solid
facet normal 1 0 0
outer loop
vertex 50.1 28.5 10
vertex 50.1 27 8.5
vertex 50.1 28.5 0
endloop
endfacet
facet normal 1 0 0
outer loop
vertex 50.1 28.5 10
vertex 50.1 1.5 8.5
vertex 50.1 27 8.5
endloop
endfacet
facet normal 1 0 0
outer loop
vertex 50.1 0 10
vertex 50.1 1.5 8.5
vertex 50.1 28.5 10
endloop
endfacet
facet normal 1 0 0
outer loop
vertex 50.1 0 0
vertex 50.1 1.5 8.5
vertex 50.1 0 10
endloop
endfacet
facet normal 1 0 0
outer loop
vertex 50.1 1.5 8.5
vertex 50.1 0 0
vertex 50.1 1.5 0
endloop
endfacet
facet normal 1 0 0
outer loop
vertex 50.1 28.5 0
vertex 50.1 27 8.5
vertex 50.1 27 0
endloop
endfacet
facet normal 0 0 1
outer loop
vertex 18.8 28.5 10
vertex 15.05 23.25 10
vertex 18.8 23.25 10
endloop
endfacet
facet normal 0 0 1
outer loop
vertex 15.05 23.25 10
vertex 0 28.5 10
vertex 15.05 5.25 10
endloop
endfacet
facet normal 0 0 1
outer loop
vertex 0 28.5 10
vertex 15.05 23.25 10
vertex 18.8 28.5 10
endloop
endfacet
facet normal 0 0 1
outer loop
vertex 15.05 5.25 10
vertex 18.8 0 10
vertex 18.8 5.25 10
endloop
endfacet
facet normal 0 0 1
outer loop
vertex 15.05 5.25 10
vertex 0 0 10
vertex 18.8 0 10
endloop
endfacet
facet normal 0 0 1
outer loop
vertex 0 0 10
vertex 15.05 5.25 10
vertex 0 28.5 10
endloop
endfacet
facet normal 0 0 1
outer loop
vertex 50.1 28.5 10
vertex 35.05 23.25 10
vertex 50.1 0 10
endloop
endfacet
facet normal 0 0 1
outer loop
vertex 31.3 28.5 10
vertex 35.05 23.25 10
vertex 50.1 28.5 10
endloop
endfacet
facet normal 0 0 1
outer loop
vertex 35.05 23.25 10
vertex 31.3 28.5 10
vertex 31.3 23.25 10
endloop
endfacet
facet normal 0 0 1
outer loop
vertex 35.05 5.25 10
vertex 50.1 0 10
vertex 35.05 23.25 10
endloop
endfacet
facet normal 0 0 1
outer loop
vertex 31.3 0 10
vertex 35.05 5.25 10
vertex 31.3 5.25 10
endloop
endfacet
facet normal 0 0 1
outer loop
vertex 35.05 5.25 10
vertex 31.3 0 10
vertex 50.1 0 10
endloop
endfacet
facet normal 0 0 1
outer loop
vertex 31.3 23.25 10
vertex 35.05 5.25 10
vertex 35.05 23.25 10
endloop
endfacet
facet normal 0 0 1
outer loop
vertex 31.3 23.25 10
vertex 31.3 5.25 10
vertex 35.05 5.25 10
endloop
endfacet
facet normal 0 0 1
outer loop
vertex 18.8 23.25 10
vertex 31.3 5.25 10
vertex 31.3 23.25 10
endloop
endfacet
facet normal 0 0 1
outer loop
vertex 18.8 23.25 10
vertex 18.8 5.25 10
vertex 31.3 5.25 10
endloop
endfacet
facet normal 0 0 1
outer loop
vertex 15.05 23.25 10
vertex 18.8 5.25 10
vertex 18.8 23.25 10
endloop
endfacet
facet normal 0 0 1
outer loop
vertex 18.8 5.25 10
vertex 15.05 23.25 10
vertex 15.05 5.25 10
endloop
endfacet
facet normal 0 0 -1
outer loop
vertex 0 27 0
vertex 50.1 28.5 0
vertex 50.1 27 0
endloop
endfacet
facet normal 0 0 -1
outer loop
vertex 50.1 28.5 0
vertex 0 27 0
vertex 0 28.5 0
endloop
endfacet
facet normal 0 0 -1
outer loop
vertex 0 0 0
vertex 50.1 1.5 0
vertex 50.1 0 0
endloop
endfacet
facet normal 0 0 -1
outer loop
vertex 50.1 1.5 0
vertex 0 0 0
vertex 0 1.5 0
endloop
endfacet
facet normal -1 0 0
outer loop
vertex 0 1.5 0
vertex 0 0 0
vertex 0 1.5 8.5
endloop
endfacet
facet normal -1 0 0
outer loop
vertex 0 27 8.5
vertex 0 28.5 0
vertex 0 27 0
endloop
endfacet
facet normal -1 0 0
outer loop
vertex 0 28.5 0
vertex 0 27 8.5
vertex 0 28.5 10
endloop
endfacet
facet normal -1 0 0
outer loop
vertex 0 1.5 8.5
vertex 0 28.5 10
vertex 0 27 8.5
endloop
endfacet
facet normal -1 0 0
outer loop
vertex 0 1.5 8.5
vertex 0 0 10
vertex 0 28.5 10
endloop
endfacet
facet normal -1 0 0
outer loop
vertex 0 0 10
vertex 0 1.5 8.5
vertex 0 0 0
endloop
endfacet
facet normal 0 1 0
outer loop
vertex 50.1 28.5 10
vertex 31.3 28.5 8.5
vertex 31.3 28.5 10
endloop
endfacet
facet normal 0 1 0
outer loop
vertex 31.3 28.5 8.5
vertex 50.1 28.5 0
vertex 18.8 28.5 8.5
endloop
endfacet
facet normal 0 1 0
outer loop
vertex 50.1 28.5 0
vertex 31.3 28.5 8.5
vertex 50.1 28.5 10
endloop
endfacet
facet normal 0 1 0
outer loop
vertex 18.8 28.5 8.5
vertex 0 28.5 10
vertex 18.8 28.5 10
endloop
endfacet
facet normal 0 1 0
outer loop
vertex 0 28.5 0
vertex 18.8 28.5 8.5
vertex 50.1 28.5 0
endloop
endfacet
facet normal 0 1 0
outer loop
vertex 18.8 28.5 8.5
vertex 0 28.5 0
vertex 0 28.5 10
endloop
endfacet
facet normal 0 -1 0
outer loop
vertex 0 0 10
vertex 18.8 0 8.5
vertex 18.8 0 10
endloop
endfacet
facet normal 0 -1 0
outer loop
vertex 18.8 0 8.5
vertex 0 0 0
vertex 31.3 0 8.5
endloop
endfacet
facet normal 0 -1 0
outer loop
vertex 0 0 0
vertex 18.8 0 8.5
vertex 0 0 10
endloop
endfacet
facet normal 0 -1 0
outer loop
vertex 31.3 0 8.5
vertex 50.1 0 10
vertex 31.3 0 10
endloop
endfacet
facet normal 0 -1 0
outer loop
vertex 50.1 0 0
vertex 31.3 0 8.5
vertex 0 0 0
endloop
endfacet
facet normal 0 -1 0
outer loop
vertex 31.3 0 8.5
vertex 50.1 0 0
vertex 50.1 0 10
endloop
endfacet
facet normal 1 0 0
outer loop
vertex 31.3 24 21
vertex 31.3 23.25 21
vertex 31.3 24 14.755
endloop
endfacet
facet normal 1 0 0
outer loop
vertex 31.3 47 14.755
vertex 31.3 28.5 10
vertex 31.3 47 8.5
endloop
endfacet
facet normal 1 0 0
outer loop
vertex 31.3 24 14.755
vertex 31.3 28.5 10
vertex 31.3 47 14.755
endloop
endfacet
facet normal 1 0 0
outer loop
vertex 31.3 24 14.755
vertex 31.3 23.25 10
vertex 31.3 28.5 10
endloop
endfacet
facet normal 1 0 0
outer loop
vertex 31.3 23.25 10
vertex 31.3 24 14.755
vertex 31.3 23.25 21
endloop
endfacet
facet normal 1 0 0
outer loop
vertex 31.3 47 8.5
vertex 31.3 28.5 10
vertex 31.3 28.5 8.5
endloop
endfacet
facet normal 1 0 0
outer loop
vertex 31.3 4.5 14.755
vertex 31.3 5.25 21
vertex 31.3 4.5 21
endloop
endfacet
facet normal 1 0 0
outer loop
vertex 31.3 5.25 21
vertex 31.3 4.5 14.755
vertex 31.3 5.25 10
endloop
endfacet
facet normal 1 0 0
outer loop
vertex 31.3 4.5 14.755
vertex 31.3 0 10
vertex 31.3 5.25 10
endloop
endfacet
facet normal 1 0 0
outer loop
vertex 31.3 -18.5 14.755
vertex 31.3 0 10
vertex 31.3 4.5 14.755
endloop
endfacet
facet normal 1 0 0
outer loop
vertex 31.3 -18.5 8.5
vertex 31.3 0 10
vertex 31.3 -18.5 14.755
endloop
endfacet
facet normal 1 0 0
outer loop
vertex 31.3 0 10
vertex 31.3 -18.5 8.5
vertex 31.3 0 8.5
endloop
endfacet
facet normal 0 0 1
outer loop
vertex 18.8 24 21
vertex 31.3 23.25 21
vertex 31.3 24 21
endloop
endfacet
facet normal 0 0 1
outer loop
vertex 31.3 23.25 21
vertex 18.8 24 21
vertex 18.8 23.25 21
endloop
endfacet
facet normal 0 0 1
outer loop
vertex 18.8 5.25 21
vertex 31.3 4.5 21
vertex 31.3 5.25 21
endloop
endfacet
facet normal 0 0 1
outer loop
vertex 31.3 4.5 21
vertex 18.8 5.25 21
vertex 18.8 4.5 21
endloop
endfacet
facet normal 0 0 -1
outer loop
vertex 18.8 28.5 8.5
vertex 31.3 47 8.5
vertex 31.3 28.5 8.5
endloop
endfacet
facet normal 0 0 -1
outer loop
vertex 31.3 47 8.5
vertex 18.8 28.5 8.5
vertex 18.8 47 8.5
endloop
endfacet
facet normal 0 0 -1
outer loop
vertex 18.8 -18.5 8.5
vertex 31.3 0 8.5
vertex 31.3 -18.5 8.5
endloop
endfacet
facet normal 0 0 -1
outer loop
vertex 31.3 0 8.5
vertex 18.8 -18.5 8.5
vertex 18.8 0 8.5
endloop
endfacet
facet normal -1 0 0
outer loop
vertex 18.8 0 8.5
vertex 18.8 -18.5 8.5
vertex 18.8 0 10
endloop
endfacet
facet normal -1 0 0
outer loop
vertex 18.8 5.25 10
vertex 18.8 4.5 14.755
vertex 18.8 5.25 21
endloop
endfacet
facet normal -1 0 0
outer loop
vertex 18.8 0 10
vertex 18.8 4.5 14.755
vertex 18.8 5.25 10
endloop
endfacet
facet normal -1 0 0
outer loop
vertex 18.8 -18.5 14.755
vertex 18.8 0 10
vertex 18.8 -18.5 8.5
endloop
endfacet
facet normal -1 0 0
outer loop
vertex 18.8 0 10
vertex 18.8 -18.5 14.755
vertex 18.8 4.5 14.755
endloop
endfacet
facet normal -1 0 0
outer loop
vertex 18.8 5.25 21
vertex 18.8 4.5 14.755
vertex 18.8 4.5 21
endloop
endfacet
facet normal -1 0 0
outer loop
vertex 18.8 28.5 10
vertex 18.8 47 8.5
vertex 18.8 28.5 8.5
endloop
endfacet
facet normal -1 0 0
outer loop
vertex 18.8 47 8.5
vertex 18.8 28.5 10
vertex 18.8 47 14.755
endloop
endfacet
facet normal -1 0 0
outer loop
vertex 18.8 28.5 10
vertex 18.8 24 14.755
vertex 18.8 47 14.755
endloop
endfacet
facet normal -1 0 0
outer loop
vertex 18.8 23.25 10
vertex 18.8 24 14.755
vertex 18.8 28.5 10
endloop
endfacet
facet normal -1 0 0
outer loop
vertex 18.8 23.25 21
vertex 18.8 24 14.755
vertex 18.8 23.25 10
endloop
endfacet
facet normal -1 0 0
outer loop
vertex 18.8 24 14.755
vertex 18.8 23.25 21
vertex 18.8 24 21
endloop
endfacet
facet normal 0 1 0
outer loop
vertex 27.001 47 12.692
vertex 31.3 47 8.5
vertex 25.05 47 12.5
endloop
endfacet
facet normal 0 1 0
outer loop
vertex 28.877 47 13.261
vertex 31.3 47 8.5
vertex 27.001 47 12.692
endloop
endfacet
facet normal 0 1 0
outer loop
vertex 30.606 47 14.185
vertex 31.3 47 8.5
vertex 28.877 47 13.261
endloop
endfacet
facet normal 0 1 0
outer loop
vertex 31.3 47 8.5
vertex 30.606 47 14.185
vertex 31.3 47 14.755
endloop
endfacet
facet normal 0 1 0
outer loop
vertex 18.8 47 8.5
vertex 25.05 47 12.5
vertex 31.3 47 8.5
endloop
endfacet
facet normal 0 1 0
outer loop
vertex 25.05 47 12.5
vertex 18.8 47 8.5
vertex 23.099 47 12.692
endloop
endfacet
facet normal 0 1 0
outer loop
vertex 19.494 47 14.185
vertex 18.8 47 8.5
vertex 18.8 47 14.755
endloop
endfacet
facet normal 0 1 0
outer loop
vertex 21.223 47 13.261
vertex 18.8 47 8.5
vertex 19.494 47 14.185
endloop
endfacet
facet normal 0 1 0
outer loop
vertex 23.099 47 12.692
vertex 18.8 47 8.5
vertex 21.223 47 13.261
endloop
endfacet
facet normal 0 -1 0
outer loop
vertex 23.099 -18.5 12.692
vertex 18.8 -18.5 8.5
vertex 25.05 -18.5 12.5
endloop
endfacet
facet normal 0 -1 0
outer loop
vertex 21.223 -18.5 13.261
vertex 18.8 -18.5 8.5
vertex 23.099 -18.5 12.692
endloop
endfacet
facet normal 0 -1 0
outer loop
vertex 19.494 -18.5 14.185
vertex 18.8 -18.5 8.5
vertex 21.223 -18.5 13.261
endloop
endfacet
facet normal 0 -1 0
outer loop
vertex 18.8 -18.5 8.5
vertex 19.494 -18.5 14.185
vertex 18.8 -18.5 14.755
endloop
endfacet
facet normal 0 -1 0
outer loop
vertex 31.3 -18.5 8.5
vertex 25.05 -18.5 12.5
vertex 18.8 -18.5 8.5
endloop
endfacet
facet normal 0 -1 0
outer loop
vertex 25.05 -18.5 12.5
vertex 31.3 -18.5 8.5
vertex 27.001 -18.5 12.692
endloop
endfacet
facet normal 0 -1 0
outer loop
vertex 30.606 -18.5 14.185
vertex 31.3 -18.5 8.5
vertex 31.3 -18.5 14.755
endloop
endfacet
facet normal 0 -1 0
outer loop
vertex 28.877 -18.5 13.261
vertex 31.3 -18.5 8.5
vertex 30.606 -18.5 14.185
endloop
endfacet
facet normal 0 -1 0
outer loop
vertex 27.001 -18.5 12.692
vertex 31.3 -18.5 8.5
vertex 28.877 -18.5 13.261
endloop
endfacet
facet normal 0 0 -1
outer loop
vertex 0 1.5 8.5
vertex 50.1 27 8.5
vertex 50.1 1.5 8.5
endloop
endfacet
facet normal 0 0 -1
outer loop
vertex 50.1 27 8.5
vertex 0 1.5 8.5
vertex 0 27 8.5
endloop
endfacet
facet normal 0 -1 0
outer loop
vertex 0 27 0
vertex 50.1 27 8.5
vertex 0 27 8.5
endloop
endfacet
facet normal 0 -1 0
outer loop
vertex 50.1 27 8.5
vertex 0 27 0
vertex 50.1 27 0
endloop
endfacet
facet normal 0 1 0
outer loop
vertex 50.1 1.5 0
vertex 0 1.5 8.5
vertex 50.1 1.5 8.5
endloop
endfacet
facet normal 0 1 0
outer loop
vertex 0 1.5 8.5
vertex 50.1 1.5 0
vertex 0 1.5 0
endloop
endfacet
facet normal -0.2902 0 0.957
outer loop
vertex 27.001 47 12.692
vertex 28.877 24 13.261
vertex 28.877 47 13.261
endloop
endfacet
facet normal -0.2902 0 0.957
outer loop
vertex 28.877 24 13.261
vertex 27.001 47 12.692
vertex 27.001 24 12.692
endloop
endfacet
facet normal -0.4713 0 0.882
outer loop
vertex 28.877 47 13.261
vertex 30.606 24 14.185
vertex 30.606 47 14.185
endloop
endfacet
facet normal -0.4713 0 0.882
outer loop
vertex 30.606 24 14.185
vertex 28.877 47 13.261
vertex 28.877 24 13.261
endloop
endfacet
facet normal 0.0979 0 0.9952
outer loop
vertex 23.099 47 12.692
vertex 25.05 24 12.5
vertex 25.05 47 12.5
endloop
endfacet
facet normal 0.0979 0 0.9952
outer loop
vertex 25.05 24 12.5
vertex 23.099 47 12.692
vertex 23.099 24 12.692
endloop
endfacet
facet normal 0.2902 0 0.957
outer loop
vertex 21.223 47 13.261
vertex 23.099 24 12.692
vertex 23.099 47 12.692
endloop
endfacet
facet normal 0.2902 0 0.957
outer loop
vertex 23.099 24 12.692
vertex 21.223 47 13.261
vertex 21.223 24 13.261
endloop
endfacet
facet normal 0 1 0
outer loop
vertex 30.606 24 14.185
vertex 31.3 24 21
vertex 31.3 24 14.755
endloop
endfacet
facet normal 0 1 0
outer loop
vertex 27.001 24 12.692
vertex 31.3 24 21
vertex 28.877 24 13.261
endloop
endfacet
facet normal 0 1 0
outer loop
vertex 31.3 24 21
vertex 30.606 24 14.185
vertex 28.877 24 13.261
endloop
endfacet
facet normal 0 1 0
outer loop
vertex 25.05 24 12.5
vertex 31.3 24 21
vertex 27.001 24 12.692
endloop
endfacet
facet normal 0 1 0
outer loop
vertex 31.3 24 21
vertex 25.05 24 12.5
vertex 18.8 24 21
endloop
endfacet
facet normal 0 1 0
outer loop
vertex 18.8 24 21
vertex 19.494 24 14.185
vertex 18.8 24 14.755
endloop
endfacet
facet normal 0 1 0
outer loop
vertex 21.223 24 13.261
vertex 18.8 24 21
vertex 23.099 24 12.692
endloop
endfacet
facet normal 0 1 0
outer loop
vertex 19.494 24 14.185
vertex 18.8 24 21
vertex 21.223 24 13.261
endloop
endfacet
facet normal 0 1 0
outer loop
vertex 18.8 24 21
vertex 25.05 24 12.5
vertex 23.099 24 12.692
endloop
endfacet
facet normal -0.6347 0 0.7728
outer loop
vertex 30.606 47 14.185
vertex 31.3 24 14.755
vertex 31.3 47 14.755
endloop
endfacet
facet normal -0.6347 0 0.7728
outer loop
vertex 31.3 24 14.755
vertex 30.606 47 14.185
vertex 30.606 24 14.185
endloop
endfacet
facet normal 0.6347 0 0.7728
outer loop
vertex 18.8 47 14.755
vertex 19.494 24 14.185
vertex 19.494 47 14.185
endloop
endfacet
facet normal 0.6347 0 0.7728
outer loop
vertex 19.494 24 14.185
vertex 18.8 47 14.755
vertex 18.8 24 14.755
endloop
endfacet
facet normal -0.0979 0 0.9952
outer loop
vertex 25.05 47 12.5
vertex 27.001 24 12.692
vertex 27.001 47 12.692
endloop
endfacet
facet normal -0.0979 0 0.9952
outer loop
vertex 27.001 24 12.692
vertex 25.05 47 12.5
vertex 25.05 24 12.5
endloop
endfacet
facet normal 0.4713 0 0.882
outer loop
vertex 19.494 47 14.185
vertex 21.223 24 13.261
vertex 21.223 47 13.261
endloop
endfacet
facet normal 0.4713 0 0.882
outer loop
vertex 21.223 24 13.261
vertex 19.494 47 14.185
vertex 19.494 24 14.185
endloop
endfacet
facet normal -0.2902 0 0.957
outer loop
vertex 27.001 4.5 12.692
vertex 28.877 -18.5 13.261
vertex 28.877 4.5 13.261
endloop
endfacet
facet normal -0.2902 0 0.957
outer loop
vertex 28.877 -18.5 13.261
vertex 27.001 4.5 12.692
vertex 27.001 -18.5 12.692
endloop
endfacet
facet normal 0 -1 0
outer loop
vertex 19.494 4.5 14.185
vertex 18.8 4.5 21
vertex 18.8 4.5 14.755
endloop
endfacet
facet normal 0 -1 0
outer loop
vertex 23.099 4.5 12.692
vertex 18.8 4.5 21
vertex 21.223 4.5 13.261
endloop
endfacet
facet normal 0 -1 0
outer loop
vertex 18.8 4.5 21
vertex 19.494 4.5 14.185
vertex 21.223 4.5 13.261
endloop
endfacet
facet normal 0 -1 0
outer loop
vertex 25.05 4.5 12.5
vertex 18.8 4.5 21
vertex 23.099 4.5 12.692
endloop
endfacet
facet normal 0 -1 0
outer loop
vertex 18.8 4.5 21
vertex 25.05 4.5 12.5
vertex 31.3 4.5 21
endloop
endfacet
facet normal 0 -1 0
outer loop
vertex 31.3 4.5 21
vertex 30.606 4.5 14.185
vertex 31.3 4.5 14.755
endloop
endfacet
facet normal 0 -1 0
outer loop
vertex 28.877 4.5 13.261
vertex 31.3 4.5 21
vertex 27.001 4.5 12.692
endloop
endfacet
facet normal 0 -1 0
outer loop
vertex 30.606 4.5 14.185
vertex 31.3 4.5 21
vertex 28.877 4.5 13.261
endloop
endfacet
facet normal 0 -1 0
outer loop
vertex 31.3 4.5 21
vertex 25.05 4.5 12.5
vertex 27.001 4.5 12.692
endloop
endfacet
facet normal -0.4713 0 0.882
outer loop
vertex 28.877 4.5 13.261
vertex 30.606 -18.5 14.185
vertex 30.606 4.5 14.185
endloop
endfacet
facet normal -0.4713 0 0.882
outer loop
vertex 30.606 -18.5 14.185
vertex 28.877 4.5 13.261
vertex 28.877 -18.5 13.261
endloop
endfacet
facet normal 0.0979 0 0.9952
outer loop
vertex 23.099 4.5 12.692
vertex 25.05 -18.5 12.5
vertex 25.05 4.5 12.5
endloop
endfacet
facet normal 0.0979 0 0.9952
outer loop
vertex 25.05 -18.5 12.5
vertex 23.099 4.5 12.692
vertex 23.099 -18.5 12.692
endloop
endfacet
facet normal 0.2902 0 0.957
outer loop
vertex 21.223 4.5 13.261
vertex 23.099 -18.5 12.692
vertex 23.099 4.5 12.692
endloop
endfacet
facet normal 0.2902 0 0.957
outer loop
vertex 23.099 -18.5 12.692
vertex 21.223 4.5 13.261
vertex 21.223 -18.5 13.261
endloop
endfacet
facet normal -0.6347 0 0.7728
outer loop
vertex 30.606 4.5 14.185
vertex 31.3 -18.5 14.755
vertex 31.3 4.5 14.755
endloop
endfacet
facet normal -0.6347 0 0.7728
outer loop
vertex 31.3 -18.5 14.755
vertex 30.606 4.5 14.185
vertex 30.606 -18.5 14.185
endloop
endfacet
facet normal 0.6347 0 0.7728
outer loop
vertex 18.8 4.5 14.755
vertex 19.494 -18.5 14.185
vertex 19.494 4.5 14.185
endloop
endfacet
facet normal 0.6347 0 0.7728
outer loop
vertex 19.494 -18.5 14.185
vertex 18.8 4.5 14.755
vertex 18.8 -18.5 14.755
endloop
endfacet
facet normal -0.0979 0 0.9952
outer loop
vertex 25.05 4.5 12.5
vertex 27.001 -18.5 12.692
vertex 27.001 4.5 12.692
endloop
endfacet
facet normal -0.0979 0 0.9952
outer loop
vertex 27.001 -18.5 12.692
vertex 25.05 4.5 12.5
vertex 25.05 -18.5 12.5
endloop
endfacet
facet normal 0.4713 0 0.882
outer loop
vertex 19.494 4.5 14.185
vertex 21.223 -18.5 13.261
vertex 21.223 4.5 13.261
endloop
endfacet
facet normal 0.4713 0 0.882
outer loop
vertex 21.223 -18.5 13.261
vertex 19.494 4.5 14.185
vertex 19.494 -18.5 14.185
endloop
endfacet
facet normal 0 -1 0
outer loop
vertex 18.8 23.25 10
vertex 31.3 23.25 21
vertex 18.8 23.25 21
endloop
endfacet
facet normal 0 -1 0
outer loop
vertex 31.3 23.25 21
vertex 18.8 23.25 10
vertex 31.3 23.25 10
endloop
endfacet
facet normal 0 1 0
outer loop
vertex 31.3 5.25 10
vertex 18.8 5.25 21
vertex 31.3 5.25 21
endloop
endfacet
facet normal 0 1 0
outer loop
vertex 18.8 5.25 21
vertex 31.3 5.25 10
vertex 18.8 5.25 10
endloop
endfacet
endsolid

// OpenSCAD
module render()
{
  // Magnet width 25.5
  // Magnet length 50.1
  // Ferrite rod width 12
  // Ferrite rod length 30
  fn = 32;
  thickness = 1.5;
  magnet_length = 50.1;
  magnet_width = 25.5;
  sample_radius = 20.0 / 2.0;
  leg_depth = 10;
  rod_width = 20;
  rod_radius = rod_width / 2.0;
  rod_length = 20;
  coil_support_length = rod_length*2 + magnet_width;
  coil_support_depth = rod_radius + 2.5;
  
  difference() {
    union() {
      cube([magnet_length,
            magnet_width+thickness*2,
            leg_depth], false);
      coil_x_offset = magnet_length/2.0 - coil_support_depth/2.0;
      coil_y_offset = coil_support_length/2.0 - magnet_width/2.0 - thickness;
      translate([coil_x_offset, -coil_y_offset,
                 leg_depth - thickness])
      cube([coil_support_depth,
            coil_support_length,
            coil_support_depth], false);
      
    }
    translate([0, +thickness, -thickness])
    cube([magnet_length, magnet_width, leg_depth], false);
    
    cyl_x_offset = magnet_length/2.0;
    cyl_y_offset = leg_depth + coil_support_depth;
    cyl_z_offset = -coil_support_length/2.0 - magnet_width/2.0 - thickness;
    rotate(a=90, v=[1,0,0])
    translate([cyl_x_offset, cyl_y_offset, cyl_z_offset])
    cylinder(rod_length+3, rod_radius, rod_radius, $fn=fn);

    cyl_x_offset = magnet_length/2.0;
    cyl_y_offset = leg_depth + coil_support_depth;
    cyl_z_offset = -coil_support_length/2.0 - magnet_width/2.0 - thickness;
    rotate(a=90, v=[1,0,0])
    translate([cyl_x_offset, cyl_y_offset, -4.5])
    cylinder(rod_length+4, rod_radius, rod_radius, $fn=fn);    

    sample_x_offset = magnet_length/2.0 - sample_radius;
    sample_y_offset = magnet_width/2.0 - sample_radius/2;
    translate([sample_x_offset, sample_y_offset-2.5, leg_depth])
    cube([sample_radius*2,
          sample_radius*1.8,
          coil_support_depth], false); 

  }
}

echo(version=version());

render();
